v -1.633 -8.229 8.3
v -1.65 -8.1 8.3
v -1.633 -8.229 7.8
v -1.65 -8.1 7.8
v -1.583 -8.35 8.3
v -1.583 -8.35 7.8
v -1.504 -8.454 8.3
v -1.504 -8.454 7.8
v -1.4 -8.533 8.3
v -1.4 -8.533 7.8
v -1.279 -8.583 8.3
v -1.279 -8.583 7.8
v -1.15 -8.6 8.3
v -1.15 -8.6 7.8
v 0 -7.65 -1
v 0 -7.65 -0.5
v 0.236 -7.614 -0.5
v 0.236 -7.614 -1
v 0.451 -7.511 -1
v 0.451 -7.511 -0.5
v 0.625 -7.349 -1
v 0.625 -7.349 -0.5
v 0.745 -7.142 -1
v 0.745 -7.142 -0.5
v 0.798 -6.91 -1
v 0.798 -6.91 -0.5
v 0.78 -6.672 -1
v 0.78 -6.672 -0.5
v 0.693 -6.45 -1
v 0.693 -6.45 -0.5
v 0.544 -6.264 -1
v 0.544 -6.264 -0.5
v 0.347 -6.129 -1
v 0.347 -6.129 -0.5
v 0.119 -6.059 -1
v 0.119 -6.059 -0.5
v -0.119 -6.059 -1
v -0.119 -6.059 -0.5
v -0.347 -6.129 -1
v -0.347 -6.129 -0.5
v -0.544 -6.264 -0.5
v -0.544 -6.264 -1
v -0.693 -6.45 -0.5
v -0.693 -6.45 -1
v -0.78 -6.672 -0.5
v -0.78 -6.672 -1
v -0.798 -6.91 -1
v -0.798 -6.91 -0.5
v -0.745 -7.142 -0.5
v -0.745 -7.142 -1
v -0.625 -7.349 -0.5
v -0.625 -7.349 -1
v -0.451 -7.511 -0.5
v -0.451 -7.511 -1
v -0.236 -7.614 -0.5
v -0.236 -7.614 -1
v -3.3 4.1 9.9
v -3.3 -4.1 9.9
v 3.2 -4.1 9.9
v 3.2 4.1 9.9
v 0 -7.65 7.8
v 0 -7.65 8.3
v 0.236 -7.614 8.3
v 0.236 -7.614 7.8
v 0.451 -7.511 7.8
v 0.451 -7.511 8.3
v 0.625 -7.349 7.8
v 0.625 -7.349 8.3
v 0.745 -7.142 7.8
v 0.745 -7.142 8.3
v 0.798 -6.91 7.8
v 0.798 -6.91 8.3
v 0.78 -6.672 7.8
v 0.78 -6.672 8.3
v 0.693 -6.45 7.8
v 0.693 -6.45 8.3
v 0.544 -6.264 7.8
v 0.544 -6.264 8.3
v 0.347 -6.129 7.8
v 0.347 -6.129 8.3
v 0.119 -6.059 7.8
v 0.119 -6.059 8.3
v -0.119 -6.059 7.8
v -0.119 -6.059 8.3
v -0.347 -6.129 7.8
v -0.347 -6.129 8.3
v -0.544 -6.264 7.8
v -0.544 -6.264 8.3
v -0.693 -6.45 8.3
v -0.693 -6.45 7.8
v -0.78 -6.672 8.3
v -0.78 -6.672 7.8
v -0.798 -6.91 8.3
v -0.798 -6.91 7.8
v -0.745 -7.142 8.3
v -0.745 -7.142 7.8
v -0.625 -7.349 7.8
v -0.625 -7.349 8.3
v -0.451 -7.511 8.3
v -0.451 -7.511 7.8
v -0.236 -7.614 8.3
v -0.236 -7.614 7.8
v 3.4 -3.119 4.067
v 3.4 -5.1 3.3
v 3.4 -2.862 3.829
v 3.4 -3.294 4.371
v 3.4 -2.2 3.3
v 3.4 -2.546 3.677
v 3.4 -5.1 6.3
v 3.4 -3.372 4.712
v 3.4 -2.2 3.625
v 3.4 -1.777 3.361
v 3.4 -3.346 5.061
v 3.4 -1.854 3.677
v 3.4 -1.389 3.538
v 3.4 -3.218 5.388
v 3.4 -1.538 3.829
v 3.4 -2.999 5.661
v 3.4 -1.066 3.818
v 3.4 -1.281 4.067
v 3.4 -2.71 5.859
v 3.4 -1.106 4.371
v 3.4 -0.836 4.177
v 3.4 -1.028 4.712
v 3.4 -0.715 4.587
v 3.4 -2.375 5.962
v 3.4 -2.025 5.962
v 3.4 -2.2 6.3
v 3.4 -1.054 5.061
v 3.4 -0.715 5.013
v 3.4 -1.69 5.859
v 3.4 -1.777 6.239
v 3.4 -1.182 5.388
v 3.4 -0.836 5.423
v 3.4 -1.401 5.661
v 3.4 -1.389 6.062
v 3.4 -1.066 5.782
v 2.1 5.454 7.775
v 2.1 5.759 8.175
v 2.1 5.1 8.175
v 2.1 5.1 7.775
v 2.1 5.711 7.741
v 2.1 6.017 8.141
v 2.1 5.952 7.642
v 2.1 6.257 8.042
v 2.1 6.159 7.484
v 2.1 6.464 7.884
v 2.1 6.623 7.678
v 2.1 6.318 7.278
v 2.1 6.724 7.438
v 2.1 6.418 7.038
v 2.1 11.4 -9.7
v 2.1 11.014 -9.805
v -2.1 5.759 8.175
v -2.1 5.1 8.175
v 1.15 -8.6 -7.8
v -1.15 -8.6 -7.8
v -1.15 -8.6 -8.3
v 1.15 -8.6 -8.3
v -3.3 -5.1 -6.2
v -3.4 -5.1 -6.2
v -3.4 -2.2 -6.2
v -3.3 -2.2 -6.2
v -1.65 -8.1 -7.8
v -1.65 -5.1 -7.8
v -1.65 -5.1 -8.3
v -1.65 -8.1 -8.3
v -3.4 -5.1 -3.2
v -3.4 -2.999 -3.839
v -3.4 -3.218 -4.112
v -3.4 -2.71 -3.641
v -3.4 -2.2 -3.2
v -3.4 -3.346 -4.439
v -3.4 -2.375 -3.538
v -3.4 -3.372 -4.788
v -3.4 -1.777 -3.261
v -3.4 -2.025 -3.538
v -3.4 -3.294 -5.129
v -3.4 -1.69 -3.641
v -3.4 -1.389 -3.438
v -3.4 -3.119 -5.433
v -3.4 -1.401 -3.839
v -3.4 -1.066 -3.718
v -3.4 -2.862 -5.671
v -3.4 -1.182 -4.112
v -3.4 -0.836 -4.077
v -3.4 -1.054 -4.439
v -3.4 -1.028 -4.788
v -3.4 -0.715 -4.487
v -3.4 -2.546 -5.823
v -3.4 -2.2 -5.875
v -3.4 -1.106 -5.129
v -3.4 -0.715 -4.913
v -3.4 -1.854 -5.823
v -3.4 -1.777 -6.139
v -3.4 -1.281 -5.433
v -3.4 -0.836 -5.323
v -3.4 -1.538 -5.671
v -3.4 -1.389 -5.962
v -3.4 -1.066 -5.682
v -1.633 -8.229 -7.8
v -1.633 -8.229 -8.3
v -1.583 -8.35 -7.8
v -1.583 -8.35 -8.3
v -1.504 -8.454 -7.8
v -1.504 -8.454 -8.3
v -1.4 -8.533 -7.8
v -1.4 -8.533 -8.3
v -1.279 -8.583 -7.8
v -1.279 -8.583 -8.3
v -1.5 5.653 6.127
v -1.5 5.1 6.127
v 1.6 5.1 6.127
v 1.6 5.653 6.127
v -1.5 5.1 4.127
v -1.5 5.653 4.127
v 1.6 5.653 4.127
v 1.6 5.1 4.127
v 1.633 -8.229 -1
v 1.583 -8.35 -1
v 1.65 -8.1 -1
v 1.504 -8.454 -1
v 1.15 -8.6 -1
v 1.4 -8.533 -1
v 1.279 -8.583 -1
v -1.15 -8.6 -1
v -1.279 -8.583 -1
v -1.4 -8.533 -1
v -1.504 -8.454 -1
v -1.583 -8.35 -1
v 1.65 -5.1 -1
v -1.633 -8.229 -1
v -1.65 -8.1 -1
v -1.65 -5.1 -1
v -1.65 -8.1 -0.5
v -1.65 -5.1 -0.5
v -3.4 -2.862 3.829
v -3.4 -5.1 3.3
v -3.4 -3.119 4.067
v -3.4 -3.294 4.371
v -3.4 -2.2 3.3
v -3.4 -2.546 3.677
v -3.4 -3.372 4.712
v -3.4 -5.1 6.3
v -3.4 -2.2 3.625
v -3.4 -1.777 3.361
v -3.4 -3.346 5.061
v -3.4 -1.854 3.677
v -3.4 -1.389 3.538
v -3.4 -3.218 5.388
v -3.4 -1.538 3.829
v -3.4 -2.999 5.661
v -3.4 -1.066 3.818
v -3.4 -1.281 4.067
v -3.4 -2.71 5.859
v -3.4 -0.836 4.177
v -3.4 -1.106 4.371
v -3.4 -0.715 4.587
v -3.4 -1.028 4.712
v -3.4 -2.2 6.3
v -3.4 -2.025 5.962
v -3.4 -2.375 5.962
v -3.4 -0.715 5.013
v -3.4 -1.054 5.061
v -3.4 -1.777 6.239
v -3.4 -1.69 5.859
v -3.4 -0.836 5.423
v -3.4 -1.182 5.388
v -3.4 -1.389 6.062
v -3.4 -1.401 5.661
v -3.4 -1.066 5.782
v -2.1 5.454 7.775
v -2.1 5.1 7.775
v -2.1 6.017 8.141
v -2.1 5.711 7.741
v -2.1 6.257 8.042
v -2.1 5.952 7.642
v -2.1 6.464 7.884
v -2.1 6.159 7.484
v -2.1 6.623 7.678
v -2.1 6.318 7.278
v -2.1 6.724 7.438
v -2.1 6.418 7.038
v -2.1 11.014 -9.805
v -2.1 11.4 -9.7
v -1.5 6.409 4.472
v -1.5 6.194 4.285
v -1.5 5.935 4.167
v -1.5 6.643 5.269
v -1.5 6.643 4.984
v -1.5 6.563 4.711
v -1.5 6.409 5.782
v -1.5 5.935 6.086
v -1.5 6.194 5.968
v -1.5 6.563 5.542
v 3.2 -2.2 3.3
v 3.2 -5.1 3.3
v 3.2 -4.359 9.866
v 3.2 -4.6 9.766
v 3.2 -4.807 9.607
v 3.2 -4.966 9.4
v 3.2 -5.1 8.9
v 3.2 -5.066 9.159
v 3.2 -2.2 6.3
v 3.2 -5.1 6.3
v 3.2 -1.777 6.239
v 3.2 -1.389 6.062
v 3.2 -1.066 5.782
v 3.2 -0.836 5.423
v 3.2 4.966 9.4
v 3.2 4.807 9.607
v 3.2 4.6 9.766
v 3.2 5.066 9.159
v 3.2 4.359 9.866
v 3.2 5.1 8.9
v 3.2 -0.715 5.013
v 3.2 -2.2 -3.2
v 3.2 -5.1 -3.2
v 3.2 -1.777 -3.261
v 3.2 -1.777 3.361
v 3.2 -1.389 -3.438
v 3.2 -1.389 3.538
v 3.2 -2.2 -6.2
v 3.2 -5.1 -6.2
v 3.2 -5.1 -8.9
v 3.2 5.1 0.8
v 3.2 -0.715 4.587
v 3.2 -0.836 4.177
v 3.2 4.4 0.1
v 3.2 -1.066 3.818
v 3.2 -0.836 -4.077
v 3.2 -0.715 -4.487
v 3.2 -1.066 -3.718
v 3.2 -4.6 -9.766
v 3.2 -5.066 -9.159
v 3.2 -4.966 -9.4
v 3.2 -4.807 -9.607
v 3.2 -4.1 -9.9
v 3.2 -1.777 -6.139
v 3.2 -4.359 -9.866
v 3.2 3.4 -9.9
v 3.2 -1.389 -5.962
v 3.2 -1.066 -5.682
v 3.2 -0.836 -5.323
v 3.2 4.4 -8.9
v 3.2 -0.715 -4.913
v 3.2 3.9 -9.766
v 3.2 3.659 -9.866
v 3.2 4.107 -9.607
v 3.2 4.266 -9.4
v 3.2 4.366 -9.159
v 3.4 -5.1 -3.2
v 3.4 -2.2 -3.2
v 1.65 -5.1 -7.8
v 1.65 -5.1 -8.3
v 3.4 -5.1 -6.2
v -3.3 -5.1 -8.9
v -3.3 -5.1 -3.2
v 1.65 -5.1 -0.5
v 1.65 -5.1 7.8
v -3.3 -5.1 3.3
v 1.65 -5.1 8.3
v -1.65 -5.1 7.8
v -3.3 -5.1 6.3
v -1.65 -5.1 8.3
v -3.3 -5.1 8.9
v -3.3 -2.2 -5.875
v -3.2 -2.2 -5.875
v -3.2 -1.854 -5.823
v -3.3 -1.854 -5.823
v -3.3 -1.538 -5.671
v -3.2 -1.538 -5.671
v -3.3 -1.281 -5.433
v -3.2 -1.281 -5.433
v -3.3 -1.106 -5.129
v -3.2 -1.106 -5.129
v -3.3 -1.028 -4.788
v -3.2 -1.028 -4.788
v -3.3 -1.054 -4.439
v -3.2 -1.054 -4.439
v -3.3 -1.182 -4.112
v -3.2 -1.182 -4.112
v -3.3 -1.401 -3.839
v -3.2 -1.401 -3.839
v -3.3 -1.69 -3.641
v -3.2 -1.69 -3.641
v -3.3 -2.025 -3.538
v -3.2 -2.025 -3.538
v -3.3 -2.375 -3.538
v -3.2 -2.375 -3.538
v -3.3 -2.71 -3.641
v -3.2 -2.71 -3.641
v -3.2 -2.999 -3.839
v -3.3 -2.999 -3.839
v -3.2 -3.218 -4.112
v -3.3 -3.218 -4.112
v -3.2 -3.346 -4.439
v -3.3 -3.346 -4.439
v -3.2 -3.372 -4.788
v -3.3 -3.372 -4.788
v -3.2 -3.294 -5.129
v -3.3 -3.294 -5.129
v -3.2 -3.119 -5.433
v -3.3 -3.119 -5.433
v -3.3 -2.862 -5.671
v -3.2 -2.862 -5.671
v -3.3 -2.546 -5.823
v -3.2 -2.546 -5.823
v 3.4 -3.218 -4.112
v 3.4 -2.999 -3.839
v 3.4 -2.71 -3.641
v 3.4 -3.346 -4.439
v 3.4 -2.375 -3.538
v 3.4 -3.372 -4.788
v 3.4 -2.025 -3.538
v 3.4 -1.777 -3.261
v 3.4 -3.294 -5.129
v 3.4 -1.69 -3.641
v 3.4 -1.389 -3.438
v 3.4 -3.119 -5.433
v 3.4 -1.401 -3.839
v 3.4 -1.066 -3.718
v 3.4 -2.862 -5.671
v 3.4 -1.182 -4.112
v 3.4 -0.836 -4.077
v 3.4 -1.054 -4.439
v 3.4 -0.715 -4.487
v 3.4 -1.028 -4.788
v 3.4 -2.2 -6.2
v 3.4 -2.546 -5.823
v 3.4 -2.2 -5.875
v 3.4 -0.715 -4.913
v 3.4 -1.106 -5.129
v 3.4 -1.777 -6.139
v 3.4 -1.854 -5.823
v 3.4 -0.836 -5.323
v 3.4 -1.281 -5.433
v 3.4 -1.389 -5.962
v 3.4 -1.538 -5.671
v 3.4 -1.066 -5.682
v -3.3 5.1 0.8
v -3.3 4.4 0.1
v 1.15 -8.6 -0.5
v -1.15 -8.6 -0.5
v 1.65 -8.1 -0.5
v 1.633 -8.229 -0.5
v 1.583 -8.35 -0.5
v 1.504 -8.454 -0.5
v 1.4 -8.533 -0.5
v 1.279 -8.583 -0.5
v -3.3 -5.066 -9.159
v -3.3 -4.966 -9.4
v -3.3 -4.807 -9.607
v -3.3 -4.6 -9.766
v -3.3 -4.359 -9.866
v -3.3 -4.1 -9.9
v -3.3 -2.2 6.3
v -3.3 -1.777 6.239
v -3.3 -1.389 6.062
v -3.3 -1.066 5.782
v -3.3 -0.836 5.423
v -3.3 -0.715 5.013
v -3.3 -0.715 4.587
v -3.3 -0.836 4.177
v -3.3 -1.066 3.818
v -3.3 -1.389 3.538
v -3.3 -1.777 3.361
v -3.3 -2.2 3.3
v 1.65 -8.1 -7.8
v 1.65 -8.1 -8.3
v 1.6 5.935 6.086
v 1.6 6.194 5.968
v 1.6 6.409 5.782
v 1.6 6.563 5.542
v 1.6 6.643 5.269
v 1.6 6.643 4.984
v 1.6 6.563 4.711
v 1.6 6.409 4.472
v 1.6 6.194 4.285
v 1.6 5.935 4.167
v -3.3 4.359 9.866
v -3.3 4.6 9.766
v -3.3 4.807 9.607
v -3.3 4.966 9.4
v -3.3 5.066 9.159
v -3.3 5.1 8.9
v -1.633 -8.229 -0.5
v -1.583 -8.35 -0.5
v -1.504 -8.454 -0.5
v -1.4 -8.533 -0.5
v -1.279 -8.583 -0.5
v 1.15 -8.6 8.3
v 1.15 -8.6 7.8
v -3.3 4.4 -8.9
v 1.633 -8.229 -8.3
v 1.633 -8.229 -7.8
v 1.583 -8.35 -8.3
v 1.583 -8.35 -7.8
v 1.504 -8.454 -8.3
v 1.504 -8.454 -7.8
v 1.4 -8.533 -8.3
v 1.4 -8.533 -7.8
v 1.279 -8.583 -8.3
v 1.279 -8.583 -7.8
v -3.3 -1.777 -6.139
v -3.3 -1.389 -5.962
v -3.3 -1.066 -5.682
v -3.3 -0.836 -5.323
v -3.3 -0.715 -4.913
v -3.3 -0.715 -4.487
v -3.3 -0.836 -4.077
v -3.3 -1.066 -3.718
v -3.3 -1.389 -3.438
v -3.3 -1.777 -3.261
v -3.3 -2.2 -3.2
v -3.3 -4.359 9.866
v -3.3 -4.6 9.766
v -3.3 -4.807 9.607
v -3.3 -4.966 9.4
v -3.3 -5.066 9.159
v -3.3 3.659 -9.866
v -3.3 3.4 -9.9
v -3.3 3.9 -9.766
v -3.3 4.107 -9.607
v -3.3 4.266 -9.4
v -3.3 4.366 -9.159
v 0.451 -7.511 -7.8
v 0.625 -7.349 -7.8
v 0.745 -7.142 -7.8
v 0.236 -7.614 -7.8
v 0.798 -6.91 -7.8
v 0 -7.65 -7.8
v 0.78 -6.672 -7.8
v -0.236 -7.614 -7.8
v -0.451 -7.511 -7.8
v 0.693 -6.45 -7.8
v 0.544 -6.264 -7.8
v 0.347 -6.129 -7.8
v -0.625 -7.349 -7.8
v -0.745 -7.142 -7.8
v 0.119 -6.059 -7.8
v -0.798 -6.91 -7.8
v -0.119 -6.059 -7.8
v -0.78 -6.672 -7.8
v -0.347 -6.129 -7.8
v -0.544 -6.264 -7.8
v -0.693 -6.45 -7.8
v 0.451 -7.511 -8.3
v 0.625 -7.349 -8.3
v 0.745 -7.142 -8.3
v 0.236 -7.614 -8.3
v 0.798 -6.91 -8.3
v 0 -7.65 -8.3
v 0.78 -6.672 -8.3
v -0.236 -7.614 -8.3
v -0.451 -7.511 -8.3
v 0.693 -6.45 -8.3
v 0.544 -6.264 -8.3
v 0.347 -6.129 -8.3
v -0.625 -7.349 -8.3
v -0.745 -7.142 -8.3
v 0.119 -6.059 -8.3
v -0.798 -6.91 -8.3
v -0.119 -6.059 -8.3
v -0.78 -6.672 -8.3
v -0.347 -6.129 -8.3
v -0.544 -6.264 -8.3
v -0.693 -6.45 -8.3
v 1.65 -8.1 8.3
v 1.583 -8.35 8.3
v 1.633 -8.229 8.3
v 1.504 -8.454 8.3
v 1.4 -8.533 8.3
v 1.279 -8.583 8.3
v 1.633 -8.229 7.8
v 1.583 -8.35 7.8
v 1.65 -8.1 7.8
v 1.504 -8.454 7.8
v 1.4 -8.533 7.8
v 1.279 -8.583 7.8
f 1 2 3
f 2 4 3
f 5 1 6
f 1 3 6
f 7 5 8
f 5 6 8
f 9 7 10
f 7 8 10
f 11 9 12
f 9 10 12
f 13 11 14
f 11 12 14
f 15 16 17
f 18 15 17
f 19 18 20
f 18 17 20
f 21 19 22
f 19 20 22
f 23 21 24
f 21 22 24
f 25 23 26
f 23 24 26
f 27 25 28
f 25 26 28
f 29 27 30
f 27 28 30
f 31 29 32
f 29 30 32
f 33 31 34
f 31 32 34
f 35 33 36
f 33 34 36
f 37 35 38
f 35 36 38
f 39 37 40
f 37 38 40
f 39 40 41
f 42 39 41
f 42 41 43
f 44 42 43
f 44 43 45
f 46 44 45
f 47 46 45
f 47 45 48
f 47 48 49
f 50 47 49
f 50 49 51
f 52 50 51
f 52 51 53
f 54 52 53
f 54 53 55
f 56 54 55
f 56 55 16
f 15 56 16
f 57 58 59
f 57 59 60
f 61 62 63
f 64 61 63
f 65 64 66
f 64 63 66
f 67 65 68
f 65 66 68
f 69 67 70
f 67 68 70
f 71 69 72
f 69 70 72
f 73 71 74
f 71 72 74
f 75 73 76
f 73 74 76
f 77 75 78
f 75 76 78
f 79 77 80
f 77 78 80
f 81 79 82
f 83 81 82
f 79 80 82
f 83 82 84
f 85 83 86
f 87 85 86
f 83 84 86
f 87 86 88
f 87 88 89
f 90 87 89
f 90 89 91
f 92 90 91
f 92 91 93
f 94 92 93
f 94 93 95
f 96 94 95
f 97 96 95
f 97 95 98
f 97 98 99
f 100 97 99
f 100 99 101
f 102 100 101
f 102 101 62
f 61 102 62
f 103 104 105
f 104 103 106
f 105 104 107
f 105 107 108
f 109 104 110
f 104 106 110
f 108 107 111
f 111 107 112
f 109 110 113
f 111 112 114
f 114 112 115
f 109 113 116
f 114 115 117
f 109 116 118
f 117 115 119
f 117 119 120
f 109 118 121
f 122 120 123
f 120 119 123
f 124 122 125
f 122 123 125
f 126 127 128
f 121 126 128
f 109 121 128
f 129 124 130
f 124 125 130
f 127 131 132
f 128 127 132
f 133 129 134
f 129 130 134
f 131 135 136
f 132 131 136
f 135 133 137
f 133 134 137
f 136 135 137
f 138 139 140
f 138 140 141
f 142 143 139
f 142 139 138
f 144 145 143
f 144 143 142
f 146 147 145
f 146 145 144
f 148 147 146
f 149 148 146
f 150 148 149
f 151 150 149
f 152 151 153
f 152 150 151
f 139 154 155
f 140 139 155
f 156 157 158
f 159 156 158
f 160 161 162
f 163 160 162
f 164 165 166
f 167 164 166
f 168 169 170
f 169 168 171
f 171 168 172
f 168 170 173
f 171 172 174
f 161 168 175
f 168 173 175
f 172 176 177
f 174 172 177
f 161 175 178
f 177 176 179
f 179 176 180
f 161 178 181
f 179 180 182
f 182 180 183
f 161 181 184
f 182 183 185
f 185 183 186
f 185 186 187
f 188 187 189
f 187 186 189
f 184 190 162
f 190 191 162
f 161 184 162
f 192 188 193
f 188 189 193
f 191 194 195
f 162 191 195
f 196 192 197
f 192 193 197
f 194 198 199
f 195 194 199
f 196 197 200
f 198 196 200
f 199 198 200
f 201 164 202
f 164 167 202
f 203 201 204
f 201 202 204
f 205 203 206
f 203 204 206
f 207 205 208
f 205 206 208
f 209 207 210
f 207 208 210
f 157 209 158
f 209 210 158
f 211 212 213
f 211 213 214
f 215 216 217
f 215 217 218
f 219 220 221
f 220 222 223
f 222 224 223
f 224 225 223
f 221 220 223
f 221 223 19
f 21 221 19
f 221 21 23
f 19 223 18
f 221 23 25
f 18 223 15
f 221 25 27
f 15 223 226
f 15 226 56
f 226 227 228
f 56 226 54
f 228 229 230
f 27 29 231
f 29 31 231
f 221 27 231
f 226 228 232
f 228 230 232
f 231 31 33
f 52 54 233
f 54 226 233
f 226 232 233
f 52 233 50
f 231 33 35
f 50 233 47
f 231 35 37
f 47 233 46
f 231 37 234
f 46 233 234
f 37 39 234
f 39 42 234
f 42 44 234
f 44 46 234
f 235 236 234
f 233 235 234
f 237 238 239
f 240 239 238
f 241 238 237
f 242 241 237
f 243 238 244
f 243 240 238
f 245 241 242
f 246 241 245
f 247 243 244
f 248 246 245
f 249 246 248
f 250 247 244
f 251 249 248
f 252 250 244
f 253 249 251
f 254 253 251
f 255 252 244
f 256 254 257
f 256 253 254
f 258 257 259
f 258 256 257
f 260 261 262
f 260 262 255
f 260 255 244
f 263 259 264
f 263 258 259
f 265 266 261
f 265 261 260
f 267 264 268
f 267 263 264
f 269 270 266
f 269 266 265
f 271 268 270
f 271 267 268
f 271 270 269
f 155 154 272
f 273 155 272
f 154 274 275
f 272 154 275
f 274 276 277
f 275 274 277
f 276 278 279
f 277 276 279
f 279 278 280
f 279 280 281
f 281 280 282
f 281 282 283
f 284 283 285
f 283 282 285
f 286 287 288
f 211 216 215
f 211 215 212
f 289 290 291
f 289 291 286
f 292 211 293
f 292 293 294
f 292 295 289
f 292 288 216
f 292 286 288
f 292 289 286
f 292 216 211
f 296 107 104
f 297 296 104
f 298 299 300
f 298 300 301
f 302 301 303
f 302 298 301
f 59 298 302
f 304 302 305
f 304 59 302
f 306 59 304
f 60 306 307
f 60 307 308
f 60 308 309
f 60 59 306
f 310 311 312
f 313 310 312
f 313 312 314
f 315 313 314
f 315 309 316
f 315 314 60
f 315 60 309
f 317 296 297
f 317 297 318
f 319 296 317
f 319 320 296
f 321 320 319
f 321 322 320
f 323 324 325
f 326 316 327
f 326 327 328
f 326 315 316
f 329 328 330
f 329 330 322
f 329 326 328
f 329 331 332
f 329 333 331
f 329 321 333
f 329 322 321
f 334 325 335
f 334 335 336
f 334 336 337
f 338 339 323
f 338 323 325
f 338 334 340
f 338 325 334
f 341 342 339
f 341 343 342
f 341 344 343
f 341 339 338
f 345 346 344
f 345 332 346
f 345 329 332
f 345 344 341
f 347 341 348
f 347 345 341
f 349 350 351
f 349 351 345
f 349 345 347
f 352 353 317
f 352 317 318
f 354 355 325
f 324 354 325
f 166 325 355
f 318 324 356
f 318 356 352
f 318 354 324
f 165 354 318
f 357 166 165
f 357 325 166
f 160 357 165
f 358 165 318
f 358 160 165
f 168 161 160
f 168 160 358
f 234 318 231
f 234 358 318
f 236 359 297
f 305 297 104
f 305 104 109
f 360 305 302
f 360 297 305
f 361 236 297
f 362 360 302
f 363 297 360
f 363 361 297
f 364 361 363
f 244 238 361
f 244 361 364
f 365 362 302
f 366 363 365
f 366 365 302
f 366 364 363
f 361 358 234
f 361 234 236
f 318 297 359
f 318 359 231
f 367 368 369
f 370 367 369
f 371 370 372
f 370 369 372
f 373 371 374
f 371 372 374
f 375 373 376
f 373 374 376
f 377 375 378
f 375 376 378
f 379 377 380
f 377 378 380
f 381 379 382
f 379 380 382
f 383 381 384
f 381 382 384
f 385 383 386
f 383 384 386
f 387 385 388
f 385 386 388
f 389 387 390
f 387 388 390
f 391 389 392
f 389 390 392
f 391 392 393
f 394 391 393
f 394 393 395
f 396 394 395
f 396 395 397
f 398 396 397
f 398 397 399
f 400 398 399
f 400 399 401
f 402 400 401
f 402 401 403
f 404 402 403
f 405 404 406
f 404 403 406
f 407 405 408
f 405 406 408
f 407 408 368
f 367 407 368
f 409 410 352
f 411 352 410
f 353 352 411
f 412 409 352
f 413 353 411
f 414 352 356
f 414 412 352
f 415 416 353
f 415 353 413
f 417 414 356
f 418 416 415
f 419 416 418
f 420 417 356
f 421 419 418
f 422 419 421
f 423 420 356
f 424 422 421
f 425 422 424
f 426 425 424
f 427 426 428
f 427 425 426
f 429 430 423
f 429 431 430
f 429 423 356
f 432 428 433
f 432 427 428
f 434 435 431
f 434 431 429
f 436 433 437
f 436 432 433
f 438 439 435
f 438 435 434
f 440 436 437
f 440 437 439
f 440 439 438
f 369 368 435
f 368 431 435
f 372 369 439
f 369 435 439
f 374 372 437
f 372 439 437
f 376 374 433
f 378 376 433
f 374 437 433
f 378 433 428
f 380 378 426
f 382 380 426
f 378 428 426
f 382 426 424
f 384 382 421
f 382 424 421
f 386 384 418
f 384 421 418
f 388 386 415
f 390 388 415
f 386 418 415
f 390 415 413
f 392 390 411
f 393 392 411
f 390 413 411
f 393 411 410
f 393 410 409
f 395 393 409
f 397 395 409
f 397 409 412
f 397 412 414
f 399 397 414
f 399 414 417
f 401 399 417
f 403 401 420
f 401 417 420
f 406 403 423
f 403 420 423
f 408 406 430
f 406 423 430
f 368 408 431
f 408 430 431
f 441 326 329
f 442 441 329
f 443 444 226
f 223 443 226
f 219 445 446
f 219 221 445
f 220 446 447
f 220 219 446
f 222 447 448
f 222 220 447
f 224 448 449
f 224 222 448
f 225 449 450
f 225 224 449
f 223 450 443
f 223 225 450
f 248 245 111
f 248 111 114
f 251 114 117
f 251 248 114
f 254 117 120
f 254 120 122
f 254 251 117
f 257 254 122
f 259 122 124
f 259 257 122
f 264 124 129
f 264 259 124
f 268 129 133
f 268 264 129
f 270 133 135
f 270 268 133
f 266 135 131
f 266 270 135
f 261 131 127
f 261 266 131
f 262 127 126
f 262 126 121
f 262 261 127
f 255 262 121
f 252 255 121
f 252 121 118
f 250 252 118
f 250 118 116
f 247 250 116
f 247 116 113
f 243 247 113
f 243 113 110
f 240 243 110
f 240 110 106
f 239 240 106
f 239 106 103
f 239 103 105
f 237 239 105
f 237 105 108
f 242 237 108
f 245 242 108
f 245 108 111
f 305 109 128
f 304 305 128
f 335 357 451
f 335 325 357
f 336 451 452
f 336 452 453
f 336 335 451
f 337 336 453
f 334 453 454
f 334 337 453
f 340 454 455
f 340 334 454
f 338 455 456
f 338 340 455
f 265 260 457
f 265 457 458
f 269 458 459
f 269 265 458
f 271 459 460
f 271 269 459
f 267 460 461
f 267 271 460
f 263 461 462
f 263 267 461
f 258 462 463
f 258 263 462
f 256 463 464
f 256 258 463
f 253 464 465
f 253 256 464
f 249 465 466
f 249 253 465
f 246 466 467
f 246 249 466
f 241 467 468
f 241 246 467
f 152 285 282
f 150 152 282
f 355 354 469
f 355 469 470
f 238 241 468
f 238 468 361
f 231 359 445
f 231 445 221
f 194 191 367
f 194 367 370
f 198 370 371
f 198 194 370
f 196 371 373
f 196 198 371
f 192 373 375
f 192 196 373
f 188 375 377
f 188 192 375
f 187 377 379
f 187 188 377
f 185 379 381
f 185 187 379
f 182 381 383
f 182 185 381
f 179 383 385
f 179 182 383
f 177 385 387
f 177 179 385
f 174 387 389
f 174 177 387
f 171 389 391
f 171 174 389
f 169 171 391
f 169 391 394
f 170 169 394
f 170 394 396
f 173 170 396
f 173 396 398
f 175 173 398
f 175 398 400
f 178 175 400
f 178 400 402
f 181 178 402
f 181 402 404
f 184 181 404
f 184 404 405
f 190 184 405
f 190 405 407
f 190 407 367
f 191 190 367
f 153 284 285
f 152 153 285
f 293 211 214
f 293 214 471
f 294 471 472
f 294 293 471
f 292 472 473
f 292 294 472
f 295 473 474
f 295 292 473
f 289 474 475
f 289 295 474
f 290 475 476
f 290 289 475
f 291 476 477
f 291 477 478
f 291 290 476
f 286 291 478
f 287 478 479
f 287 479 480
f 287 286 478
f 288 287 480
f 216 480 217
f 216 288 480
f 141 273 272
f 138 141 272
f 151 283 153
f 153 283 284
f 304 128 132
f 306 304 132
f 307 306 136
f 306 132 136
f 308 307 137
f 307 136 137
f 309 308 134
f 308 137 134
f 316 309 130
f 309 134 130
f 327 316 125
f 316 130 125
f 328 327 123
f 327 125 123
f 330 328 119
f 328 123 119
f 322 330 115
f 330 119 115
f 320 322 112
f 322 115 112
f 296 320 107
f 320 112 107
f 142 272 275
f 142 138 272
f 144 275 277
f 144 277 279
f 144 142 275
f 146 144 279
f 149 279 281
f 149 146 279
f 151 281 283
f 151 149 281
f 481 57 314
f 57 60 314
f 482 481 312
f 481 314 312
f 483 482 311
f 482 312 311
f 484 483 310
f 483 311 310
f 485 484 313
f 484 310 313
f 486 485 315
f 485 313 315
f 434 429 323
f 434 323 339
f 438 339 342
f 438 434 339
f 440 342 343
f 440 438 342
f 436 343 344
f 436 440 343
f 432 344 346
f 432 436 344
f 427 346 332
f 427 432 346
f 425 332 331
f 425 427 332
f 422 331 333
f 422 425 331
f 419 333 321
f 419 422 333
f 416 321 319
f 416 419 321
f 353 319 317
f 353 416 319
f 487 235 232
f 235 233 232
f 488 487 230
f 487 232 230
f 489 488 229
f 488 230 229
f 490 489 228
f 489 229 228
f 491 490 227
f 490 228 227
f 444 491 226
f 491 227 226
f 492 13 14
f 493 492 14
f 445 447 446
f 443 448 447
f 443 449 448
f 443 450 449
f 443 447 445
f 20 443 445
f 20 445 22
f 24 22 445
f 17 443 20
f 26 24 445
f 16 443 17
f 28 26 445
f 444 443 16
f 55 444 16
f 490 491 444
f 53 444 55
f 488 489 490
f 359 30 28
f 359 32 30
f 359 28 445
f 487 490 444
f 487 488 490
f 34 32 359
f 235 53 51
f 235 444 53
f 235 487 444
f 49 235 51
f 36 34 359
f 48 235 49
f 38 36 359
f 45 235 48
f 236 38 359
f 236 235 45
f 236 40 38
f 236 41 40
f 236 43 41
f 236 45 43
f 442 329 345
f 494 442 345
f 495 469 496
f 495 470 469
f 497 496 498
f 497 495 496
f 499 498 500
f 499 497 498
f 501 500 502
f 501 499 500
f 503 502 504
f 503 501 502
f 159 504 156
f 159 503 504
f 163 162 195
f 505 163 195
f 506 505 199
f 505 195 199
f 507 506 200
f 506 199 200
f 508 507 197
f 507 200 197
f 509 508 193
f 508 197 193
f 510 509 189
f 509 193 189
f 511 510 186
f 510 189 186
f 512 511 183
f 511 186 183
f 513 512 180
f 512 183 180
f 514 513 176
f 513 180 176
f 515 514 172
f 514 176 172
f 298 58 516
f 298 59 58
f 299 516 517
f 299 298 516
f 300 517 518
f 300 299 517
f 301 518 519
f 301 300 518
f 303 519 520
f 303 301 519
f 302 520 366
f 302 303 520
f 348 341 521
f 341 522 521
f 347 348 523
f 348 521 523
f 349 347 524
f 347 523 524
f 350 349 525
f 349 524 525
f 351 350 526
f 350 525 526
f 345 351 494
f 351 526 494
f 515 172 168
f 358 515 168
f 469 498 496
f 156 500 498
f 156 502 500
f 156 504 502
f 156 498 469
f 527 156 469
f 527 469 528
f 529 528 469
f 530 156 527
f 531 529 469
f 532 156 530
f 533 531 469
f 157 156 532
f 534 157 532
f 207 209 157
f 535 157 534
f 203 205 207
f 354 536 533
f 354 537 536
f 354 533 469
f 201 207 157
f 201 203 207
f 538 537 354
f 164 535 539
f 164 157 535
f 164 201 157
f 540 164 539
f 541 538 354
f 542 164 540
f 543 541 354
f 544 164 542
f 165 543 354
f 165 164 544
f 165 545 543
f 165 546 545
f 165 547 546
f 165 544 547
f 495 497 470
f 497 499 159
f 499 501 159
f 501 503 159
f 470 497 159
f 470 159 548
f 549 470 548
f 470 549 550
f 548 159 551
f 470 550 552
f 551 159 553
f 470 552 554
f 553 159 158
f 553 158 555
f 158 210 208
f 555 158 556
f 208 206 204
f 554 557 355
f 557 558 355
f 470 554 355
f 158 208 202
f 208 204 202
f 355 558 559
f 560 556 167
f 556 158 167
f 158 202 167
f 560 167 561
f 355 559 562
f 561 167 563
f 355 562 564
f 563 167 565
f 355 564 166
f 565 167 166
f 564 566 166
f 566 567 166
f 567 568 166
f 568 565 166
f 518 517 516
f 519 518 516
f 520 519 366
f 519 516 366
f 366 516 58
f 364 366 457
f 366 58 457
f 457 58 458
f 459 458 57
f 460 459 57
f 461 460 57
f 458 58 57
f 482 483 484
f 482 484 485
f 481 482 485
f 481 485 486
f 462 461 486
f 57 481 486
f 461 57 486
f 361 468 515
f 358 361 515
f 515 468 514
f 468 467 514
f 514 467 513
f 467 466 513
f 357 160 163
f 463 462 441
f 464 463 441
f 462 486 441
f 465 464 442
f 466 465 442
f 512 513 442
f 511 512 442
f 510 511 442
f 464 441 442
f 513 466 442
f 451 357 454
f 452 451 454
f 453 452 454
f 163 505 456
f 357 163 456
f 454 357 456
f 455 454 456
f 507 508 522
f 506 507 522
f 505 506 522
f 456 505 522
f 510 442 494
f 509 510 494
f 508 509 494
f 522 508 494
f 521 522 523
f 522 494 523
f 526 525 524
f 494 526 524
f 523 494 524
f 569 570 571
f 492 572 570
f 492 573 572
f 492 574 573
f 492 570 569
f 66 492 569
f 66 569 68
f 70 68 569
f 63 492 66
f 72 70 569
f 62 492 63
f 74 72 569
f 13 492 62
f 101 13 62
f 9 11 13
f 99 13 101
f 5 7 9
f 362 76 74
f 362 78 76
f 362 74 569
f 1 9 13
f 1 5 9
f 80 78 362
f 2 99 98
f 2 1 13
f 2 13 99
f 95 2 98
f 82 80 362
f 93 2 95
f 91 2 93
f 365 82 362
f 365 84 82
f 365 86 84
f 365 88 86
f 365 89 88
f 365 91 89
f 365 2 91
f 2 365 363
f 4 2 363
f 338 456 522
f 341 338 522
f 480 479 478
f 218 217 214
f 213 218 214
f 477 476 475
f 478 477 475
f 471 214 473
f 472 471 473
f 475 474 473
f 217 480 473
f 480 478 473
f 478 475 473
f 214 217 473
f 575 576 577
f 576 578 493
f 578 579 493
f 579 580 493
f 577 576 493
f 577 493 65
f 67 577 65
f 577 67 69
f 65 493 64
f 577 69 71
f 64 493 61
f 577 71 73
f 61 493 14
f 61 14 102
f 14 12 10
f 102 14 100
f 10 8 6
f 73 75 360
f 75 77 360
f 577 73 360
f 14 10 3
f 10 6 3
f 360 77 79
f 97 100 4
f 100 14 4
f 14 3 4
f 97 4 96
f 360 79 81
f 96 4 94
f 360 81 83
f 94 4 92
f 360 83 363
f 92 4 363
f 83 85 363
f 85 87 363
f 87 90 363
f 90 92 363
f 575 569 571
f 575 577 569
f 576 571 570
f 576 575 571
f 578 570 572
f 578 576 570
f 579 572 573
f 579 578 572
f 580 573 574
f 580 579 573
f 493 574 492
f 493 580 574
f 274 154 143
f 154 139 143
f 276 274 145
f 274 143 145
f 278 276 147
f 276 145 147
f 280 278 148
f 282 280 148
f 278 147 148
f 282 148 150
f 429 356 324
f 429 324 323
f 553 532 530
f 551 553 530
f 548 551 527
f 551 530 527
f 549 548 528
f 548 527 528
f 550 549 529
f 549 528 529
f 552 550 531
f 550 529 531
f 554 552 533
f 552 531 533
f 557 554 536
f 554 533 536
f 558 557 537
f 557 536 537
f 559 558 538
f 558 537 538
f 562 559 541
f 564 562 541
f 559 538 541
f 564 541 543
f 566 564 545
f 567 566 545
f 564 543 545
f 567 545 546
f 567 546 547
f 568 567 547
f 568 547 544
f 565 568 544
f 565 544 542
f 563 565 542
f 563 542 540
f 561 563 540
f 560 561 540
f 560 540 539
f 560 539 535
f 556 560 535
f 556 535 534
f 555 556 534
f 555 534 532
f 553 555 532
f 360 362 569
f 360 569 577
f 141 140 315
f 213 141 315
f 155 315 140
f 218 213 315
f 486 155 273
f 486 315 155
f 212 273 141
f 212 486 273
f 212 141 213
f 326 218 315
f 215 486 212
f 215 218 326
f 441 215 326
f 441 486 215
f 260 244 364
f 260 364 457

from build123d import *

# Parameters (mm, degrees)
EXTRUDE_1_DEPTH      = 3.2
EXTRUDE_1_DEPTH_BACK = 3.3
SKETCH_1_W           = 19.8
SKETCH_1_H           = 10.2
CUT_EXTRUDE_1_DEPTH  = 13.894572502
FILLET_1_R           = 1
EXTRUDE_2_DEPTH      = 1.65
EXTRUDE_2_DEPTH_BACK = 1.65
SKETCH_4_W           = 0.5
SKETCH_4_H           = 3.5
FILLET_2_R           = 0.5
SKETCH_5_R           = 0.8
CUT_EXTRUDE_2_DEPTH  = 21.398284242
SKETCH_8_R           = 1.175
CUT_EXTRUDE_3_DEPTH  = 15.636256352
EXTRUDE_3_DEPTH      = 2.1
EXTRUDE_3_DEPTH_BACK = 2.1
EXTRUDE_5_DEPTH      = 1.6
EXTRUDE_5_DEPTH_BACK = 1.5
FILLET_3_R           = 1
EXTRUDE_START        = 0.2
SKETCH_9_R           = 1.175
EXTRUDE_6_DEPTH      = 0.2


with BuildPart() as part:
    # 草图1 → 凸台-拉伸1 (new, two sides: drawn at the far end of the back side and taken through both)
    with BuildSketch(Plane(origin=(0, 0, 0), x_dir=(0, 0, -1), z_dir=(1, 0, 0)).offset(-EXTRUDE_1_DEPTH_BACK)):
        Rectangle(SKETCH_1_W, SKETCH_1_H)
    extrude(amount=EXTRUDE_1_DEPTH + EXTRUDE_1_DEPTH_BACK)

    # 草图2 → 切除-拉伸1 (cut, through all)
    with BuildSketch(Plane(origin=(3.2, 0, 0), x_dir=(0, 0, -1), z_dir=(1, 0, 0))):
        Polygon((-0.8, 5.1), (-0.1, 4.4), (9.9, 4.4), (9.9, 5.1), align=None)
    extrude(amount=-CUT_EXTRUDE_1_DEPTH, mode=Mode.SUBTRACT)

    # 圆角1
    fillet_1_edges = [part.edges().sort_by_distance(p)[0] for p in [
        (-0.05, 4.4, -9.9),
        (-0.05, -5.1, -9.9),
        (-0.05, -5.1, 9.9),
        (-0.05, 5.1, 9.9),
    ]]
    fillet(fillet_1_edges, radius=FILLET_1_R)

    # 草图4 → 凸台-拉伸2 (add, two sides: drawn at the far end of the back side and taken through both)
    with BuildSketch(Plane(origin=(0, 0, 0), x_dir=(0, 0, -1), z_dir=(1, 0, 0)).offset(-EXTRUDE_2_DEPTH_BACK)):
        with Locations((-8.05, -6.85)):
            Rectangle(SKETCH_4_W, SKETCH_4_H)
        with Locations((0.75, -6.85)):
            Rectangle(SKETCH_4_W, SKETCH_4_H)
        with Locations((8.05, -6.85)):
            Rectangle(SKETCH_4_W, SKETCH_4_H)
    extrude(amount=EXTRUDE_2_DEPTH + EXTRUDE_2_DEPTH_BACK)

    # 圆角2
    fillet_2_edges = [part.edges().sort_by_distance(p)[0] for p in [
        (-1.65, -8.6, 8.05),
        (1.65, -8.6, 8.05),
        (-1.65, -8.6, -0.75),
        (1.65, -8.6, -0.75),
        (1.65, -8.6, -8.05),
        (-1.65, -8.6, -8.05),
    ]]
    fillet(fillet_2_edges, radius=FILLET_2_R)

    # 草图5 → 切除-拉伸2 (cut, through all)
    with BuildSketch(Plane.XY.offset(8.3)):
        with Locations(Location((0, -6.85, 0), (0, 0, 270))):
            Circle(SKETCH_5_R)
    extrude(amount=-CUT_EXTRUDE_2_DEPTH, mode=Mode.SUBTRACT)

    # 草图8 → 切除-拉伸3 (cut, through all)
    with BuildSketch(Plane(origin=(3.2, 0, 0), x_dir=(0, 0, -1), z_dir=(1, 0, 0))):
        with Locations((-4.8, -2.2)):
            Circle(SKETCH_8_R)
        with Locations((4.7, -2.2)):
            Circle(SKETCH_8_R)
    extrude(amount=-CUT_EXTRUDE_3_DEPTH, mode=Mode.SUBTRACT)

    # 草图6 → 凸台-拉伸3 (add, two sides: drawn at the far end of the back side and taken through both)
    with BuildSketch(Plane(origin=(0, 0, 0), x_dir=(0, 0, -1), z_dir=(1, 0, 0)).offset(-EXTRUDE_3_DEPTH_BACK)):
        Polygon((-7.775241221, 6.217237719), (9.805291462, 11.014106611), (9.7, 11.4), (-8.175241221, 6.52271954), (-8.175241221, 5.1), (-7.775241221, 5.1), align=None)
    extrude(amount=EXTRUDE_3_DEPTH + EXTRUDE_3_DEPTH_BACK)

    # 草图7 → 凸台-拉伸5 (add, two sides: drawn at the far end of the back side and taken through both)
    with BuildSketch(Plane(origin=(0, 0, 0), x_dir=(0, 0, -1), z_dir=(1, 0, 0)).offset(-EXTRUDE_5_DEPTH_BACK)):
        with BuildLine():
            Line((-4.126745085, 5.653223192), (-4.126745085, 5.1))
            Line((-4.126745085, 5.1), (-6.126745085, 5.1))
            Line((-6.126745085, 5.1), (-6.126745085, 5.653223192))
            ThreePointArc((-6.126745085, 5.653223192), (-5.126745085, 6.653223192), (-4.126745085, 5.653223192))
        make_face()
    extrude(amount=EXTRUDE_5_DEPTH + EXTRUDE_5_DEPTH_BACK)

    # 圆角3
    fillet_3_edges = [part.edges().sort_by_distance(p)[0] for p in [
        (0, 6.217237719, 7.775241221),
        (0, 6.52271954, 8.175241221),
    ]]
    fillet(fillet_3_edges, radius=FILLET_3_R)

    # 草图9 → 凸台-拉伸6 (add)
    # profile 1 of 2: a face of its own
    with BuildSketch(Plane(origin=(3.2, 0, 0), x_dir=(0, 0, -1), z_dir=(1, 0, 0)).offset(EXTRUDE_START)):
        with BuildLine():
            Line((-3.3, -2.2), (-3.3, -5.1))
            Line((-3.3, -5.1), (-6.3, -5.1))
            Line((-6.3, -5.1), (-6.3, -2.2))
            ThreePointArc((-6.3, -2.2), (-4.8, -0.7), (-3.3, -2.2))
        make_face()
        with Locations((-4.8, -2.2)):
            Circle(SKETCH_9_R, mode=Mode.SUBTRACT)
    # profile 2 of 2: a face of its own
    with BuildSketch(Plane(origin=(3.2, 0, 0), x_dir=(0, 0, -1), z_dir=(1, 0, 0)).offset(EXTRUDE_START)):
        with BuildLine():
            Line((3.2, -2.2), (3.2, -5.1))
            Line((3.2, -5.1), (6.2, -5.1))
            Line((6.2, -5.1), (6.2, -2.2))
            ThreePointArc((6.2, -2.2), (4.7, -0.7), (3.2, -2.2))
        make_face()
        with Locations((4.7, -2.2)):
            Circle(SKETCH_9_R, mode=Mode.SUBTRACT)
    extrude_6 = extrude(amount=-EXTRUDE_6_DEPTH)

    # 镜向1: 凸台-拉伸6 across plane
    add(extrude_6.mirror(Plane(origin=(0, 0, 0), x_dir=(0, 0, 1), z_dir=(1, 0, 0))))


solid = part.part
